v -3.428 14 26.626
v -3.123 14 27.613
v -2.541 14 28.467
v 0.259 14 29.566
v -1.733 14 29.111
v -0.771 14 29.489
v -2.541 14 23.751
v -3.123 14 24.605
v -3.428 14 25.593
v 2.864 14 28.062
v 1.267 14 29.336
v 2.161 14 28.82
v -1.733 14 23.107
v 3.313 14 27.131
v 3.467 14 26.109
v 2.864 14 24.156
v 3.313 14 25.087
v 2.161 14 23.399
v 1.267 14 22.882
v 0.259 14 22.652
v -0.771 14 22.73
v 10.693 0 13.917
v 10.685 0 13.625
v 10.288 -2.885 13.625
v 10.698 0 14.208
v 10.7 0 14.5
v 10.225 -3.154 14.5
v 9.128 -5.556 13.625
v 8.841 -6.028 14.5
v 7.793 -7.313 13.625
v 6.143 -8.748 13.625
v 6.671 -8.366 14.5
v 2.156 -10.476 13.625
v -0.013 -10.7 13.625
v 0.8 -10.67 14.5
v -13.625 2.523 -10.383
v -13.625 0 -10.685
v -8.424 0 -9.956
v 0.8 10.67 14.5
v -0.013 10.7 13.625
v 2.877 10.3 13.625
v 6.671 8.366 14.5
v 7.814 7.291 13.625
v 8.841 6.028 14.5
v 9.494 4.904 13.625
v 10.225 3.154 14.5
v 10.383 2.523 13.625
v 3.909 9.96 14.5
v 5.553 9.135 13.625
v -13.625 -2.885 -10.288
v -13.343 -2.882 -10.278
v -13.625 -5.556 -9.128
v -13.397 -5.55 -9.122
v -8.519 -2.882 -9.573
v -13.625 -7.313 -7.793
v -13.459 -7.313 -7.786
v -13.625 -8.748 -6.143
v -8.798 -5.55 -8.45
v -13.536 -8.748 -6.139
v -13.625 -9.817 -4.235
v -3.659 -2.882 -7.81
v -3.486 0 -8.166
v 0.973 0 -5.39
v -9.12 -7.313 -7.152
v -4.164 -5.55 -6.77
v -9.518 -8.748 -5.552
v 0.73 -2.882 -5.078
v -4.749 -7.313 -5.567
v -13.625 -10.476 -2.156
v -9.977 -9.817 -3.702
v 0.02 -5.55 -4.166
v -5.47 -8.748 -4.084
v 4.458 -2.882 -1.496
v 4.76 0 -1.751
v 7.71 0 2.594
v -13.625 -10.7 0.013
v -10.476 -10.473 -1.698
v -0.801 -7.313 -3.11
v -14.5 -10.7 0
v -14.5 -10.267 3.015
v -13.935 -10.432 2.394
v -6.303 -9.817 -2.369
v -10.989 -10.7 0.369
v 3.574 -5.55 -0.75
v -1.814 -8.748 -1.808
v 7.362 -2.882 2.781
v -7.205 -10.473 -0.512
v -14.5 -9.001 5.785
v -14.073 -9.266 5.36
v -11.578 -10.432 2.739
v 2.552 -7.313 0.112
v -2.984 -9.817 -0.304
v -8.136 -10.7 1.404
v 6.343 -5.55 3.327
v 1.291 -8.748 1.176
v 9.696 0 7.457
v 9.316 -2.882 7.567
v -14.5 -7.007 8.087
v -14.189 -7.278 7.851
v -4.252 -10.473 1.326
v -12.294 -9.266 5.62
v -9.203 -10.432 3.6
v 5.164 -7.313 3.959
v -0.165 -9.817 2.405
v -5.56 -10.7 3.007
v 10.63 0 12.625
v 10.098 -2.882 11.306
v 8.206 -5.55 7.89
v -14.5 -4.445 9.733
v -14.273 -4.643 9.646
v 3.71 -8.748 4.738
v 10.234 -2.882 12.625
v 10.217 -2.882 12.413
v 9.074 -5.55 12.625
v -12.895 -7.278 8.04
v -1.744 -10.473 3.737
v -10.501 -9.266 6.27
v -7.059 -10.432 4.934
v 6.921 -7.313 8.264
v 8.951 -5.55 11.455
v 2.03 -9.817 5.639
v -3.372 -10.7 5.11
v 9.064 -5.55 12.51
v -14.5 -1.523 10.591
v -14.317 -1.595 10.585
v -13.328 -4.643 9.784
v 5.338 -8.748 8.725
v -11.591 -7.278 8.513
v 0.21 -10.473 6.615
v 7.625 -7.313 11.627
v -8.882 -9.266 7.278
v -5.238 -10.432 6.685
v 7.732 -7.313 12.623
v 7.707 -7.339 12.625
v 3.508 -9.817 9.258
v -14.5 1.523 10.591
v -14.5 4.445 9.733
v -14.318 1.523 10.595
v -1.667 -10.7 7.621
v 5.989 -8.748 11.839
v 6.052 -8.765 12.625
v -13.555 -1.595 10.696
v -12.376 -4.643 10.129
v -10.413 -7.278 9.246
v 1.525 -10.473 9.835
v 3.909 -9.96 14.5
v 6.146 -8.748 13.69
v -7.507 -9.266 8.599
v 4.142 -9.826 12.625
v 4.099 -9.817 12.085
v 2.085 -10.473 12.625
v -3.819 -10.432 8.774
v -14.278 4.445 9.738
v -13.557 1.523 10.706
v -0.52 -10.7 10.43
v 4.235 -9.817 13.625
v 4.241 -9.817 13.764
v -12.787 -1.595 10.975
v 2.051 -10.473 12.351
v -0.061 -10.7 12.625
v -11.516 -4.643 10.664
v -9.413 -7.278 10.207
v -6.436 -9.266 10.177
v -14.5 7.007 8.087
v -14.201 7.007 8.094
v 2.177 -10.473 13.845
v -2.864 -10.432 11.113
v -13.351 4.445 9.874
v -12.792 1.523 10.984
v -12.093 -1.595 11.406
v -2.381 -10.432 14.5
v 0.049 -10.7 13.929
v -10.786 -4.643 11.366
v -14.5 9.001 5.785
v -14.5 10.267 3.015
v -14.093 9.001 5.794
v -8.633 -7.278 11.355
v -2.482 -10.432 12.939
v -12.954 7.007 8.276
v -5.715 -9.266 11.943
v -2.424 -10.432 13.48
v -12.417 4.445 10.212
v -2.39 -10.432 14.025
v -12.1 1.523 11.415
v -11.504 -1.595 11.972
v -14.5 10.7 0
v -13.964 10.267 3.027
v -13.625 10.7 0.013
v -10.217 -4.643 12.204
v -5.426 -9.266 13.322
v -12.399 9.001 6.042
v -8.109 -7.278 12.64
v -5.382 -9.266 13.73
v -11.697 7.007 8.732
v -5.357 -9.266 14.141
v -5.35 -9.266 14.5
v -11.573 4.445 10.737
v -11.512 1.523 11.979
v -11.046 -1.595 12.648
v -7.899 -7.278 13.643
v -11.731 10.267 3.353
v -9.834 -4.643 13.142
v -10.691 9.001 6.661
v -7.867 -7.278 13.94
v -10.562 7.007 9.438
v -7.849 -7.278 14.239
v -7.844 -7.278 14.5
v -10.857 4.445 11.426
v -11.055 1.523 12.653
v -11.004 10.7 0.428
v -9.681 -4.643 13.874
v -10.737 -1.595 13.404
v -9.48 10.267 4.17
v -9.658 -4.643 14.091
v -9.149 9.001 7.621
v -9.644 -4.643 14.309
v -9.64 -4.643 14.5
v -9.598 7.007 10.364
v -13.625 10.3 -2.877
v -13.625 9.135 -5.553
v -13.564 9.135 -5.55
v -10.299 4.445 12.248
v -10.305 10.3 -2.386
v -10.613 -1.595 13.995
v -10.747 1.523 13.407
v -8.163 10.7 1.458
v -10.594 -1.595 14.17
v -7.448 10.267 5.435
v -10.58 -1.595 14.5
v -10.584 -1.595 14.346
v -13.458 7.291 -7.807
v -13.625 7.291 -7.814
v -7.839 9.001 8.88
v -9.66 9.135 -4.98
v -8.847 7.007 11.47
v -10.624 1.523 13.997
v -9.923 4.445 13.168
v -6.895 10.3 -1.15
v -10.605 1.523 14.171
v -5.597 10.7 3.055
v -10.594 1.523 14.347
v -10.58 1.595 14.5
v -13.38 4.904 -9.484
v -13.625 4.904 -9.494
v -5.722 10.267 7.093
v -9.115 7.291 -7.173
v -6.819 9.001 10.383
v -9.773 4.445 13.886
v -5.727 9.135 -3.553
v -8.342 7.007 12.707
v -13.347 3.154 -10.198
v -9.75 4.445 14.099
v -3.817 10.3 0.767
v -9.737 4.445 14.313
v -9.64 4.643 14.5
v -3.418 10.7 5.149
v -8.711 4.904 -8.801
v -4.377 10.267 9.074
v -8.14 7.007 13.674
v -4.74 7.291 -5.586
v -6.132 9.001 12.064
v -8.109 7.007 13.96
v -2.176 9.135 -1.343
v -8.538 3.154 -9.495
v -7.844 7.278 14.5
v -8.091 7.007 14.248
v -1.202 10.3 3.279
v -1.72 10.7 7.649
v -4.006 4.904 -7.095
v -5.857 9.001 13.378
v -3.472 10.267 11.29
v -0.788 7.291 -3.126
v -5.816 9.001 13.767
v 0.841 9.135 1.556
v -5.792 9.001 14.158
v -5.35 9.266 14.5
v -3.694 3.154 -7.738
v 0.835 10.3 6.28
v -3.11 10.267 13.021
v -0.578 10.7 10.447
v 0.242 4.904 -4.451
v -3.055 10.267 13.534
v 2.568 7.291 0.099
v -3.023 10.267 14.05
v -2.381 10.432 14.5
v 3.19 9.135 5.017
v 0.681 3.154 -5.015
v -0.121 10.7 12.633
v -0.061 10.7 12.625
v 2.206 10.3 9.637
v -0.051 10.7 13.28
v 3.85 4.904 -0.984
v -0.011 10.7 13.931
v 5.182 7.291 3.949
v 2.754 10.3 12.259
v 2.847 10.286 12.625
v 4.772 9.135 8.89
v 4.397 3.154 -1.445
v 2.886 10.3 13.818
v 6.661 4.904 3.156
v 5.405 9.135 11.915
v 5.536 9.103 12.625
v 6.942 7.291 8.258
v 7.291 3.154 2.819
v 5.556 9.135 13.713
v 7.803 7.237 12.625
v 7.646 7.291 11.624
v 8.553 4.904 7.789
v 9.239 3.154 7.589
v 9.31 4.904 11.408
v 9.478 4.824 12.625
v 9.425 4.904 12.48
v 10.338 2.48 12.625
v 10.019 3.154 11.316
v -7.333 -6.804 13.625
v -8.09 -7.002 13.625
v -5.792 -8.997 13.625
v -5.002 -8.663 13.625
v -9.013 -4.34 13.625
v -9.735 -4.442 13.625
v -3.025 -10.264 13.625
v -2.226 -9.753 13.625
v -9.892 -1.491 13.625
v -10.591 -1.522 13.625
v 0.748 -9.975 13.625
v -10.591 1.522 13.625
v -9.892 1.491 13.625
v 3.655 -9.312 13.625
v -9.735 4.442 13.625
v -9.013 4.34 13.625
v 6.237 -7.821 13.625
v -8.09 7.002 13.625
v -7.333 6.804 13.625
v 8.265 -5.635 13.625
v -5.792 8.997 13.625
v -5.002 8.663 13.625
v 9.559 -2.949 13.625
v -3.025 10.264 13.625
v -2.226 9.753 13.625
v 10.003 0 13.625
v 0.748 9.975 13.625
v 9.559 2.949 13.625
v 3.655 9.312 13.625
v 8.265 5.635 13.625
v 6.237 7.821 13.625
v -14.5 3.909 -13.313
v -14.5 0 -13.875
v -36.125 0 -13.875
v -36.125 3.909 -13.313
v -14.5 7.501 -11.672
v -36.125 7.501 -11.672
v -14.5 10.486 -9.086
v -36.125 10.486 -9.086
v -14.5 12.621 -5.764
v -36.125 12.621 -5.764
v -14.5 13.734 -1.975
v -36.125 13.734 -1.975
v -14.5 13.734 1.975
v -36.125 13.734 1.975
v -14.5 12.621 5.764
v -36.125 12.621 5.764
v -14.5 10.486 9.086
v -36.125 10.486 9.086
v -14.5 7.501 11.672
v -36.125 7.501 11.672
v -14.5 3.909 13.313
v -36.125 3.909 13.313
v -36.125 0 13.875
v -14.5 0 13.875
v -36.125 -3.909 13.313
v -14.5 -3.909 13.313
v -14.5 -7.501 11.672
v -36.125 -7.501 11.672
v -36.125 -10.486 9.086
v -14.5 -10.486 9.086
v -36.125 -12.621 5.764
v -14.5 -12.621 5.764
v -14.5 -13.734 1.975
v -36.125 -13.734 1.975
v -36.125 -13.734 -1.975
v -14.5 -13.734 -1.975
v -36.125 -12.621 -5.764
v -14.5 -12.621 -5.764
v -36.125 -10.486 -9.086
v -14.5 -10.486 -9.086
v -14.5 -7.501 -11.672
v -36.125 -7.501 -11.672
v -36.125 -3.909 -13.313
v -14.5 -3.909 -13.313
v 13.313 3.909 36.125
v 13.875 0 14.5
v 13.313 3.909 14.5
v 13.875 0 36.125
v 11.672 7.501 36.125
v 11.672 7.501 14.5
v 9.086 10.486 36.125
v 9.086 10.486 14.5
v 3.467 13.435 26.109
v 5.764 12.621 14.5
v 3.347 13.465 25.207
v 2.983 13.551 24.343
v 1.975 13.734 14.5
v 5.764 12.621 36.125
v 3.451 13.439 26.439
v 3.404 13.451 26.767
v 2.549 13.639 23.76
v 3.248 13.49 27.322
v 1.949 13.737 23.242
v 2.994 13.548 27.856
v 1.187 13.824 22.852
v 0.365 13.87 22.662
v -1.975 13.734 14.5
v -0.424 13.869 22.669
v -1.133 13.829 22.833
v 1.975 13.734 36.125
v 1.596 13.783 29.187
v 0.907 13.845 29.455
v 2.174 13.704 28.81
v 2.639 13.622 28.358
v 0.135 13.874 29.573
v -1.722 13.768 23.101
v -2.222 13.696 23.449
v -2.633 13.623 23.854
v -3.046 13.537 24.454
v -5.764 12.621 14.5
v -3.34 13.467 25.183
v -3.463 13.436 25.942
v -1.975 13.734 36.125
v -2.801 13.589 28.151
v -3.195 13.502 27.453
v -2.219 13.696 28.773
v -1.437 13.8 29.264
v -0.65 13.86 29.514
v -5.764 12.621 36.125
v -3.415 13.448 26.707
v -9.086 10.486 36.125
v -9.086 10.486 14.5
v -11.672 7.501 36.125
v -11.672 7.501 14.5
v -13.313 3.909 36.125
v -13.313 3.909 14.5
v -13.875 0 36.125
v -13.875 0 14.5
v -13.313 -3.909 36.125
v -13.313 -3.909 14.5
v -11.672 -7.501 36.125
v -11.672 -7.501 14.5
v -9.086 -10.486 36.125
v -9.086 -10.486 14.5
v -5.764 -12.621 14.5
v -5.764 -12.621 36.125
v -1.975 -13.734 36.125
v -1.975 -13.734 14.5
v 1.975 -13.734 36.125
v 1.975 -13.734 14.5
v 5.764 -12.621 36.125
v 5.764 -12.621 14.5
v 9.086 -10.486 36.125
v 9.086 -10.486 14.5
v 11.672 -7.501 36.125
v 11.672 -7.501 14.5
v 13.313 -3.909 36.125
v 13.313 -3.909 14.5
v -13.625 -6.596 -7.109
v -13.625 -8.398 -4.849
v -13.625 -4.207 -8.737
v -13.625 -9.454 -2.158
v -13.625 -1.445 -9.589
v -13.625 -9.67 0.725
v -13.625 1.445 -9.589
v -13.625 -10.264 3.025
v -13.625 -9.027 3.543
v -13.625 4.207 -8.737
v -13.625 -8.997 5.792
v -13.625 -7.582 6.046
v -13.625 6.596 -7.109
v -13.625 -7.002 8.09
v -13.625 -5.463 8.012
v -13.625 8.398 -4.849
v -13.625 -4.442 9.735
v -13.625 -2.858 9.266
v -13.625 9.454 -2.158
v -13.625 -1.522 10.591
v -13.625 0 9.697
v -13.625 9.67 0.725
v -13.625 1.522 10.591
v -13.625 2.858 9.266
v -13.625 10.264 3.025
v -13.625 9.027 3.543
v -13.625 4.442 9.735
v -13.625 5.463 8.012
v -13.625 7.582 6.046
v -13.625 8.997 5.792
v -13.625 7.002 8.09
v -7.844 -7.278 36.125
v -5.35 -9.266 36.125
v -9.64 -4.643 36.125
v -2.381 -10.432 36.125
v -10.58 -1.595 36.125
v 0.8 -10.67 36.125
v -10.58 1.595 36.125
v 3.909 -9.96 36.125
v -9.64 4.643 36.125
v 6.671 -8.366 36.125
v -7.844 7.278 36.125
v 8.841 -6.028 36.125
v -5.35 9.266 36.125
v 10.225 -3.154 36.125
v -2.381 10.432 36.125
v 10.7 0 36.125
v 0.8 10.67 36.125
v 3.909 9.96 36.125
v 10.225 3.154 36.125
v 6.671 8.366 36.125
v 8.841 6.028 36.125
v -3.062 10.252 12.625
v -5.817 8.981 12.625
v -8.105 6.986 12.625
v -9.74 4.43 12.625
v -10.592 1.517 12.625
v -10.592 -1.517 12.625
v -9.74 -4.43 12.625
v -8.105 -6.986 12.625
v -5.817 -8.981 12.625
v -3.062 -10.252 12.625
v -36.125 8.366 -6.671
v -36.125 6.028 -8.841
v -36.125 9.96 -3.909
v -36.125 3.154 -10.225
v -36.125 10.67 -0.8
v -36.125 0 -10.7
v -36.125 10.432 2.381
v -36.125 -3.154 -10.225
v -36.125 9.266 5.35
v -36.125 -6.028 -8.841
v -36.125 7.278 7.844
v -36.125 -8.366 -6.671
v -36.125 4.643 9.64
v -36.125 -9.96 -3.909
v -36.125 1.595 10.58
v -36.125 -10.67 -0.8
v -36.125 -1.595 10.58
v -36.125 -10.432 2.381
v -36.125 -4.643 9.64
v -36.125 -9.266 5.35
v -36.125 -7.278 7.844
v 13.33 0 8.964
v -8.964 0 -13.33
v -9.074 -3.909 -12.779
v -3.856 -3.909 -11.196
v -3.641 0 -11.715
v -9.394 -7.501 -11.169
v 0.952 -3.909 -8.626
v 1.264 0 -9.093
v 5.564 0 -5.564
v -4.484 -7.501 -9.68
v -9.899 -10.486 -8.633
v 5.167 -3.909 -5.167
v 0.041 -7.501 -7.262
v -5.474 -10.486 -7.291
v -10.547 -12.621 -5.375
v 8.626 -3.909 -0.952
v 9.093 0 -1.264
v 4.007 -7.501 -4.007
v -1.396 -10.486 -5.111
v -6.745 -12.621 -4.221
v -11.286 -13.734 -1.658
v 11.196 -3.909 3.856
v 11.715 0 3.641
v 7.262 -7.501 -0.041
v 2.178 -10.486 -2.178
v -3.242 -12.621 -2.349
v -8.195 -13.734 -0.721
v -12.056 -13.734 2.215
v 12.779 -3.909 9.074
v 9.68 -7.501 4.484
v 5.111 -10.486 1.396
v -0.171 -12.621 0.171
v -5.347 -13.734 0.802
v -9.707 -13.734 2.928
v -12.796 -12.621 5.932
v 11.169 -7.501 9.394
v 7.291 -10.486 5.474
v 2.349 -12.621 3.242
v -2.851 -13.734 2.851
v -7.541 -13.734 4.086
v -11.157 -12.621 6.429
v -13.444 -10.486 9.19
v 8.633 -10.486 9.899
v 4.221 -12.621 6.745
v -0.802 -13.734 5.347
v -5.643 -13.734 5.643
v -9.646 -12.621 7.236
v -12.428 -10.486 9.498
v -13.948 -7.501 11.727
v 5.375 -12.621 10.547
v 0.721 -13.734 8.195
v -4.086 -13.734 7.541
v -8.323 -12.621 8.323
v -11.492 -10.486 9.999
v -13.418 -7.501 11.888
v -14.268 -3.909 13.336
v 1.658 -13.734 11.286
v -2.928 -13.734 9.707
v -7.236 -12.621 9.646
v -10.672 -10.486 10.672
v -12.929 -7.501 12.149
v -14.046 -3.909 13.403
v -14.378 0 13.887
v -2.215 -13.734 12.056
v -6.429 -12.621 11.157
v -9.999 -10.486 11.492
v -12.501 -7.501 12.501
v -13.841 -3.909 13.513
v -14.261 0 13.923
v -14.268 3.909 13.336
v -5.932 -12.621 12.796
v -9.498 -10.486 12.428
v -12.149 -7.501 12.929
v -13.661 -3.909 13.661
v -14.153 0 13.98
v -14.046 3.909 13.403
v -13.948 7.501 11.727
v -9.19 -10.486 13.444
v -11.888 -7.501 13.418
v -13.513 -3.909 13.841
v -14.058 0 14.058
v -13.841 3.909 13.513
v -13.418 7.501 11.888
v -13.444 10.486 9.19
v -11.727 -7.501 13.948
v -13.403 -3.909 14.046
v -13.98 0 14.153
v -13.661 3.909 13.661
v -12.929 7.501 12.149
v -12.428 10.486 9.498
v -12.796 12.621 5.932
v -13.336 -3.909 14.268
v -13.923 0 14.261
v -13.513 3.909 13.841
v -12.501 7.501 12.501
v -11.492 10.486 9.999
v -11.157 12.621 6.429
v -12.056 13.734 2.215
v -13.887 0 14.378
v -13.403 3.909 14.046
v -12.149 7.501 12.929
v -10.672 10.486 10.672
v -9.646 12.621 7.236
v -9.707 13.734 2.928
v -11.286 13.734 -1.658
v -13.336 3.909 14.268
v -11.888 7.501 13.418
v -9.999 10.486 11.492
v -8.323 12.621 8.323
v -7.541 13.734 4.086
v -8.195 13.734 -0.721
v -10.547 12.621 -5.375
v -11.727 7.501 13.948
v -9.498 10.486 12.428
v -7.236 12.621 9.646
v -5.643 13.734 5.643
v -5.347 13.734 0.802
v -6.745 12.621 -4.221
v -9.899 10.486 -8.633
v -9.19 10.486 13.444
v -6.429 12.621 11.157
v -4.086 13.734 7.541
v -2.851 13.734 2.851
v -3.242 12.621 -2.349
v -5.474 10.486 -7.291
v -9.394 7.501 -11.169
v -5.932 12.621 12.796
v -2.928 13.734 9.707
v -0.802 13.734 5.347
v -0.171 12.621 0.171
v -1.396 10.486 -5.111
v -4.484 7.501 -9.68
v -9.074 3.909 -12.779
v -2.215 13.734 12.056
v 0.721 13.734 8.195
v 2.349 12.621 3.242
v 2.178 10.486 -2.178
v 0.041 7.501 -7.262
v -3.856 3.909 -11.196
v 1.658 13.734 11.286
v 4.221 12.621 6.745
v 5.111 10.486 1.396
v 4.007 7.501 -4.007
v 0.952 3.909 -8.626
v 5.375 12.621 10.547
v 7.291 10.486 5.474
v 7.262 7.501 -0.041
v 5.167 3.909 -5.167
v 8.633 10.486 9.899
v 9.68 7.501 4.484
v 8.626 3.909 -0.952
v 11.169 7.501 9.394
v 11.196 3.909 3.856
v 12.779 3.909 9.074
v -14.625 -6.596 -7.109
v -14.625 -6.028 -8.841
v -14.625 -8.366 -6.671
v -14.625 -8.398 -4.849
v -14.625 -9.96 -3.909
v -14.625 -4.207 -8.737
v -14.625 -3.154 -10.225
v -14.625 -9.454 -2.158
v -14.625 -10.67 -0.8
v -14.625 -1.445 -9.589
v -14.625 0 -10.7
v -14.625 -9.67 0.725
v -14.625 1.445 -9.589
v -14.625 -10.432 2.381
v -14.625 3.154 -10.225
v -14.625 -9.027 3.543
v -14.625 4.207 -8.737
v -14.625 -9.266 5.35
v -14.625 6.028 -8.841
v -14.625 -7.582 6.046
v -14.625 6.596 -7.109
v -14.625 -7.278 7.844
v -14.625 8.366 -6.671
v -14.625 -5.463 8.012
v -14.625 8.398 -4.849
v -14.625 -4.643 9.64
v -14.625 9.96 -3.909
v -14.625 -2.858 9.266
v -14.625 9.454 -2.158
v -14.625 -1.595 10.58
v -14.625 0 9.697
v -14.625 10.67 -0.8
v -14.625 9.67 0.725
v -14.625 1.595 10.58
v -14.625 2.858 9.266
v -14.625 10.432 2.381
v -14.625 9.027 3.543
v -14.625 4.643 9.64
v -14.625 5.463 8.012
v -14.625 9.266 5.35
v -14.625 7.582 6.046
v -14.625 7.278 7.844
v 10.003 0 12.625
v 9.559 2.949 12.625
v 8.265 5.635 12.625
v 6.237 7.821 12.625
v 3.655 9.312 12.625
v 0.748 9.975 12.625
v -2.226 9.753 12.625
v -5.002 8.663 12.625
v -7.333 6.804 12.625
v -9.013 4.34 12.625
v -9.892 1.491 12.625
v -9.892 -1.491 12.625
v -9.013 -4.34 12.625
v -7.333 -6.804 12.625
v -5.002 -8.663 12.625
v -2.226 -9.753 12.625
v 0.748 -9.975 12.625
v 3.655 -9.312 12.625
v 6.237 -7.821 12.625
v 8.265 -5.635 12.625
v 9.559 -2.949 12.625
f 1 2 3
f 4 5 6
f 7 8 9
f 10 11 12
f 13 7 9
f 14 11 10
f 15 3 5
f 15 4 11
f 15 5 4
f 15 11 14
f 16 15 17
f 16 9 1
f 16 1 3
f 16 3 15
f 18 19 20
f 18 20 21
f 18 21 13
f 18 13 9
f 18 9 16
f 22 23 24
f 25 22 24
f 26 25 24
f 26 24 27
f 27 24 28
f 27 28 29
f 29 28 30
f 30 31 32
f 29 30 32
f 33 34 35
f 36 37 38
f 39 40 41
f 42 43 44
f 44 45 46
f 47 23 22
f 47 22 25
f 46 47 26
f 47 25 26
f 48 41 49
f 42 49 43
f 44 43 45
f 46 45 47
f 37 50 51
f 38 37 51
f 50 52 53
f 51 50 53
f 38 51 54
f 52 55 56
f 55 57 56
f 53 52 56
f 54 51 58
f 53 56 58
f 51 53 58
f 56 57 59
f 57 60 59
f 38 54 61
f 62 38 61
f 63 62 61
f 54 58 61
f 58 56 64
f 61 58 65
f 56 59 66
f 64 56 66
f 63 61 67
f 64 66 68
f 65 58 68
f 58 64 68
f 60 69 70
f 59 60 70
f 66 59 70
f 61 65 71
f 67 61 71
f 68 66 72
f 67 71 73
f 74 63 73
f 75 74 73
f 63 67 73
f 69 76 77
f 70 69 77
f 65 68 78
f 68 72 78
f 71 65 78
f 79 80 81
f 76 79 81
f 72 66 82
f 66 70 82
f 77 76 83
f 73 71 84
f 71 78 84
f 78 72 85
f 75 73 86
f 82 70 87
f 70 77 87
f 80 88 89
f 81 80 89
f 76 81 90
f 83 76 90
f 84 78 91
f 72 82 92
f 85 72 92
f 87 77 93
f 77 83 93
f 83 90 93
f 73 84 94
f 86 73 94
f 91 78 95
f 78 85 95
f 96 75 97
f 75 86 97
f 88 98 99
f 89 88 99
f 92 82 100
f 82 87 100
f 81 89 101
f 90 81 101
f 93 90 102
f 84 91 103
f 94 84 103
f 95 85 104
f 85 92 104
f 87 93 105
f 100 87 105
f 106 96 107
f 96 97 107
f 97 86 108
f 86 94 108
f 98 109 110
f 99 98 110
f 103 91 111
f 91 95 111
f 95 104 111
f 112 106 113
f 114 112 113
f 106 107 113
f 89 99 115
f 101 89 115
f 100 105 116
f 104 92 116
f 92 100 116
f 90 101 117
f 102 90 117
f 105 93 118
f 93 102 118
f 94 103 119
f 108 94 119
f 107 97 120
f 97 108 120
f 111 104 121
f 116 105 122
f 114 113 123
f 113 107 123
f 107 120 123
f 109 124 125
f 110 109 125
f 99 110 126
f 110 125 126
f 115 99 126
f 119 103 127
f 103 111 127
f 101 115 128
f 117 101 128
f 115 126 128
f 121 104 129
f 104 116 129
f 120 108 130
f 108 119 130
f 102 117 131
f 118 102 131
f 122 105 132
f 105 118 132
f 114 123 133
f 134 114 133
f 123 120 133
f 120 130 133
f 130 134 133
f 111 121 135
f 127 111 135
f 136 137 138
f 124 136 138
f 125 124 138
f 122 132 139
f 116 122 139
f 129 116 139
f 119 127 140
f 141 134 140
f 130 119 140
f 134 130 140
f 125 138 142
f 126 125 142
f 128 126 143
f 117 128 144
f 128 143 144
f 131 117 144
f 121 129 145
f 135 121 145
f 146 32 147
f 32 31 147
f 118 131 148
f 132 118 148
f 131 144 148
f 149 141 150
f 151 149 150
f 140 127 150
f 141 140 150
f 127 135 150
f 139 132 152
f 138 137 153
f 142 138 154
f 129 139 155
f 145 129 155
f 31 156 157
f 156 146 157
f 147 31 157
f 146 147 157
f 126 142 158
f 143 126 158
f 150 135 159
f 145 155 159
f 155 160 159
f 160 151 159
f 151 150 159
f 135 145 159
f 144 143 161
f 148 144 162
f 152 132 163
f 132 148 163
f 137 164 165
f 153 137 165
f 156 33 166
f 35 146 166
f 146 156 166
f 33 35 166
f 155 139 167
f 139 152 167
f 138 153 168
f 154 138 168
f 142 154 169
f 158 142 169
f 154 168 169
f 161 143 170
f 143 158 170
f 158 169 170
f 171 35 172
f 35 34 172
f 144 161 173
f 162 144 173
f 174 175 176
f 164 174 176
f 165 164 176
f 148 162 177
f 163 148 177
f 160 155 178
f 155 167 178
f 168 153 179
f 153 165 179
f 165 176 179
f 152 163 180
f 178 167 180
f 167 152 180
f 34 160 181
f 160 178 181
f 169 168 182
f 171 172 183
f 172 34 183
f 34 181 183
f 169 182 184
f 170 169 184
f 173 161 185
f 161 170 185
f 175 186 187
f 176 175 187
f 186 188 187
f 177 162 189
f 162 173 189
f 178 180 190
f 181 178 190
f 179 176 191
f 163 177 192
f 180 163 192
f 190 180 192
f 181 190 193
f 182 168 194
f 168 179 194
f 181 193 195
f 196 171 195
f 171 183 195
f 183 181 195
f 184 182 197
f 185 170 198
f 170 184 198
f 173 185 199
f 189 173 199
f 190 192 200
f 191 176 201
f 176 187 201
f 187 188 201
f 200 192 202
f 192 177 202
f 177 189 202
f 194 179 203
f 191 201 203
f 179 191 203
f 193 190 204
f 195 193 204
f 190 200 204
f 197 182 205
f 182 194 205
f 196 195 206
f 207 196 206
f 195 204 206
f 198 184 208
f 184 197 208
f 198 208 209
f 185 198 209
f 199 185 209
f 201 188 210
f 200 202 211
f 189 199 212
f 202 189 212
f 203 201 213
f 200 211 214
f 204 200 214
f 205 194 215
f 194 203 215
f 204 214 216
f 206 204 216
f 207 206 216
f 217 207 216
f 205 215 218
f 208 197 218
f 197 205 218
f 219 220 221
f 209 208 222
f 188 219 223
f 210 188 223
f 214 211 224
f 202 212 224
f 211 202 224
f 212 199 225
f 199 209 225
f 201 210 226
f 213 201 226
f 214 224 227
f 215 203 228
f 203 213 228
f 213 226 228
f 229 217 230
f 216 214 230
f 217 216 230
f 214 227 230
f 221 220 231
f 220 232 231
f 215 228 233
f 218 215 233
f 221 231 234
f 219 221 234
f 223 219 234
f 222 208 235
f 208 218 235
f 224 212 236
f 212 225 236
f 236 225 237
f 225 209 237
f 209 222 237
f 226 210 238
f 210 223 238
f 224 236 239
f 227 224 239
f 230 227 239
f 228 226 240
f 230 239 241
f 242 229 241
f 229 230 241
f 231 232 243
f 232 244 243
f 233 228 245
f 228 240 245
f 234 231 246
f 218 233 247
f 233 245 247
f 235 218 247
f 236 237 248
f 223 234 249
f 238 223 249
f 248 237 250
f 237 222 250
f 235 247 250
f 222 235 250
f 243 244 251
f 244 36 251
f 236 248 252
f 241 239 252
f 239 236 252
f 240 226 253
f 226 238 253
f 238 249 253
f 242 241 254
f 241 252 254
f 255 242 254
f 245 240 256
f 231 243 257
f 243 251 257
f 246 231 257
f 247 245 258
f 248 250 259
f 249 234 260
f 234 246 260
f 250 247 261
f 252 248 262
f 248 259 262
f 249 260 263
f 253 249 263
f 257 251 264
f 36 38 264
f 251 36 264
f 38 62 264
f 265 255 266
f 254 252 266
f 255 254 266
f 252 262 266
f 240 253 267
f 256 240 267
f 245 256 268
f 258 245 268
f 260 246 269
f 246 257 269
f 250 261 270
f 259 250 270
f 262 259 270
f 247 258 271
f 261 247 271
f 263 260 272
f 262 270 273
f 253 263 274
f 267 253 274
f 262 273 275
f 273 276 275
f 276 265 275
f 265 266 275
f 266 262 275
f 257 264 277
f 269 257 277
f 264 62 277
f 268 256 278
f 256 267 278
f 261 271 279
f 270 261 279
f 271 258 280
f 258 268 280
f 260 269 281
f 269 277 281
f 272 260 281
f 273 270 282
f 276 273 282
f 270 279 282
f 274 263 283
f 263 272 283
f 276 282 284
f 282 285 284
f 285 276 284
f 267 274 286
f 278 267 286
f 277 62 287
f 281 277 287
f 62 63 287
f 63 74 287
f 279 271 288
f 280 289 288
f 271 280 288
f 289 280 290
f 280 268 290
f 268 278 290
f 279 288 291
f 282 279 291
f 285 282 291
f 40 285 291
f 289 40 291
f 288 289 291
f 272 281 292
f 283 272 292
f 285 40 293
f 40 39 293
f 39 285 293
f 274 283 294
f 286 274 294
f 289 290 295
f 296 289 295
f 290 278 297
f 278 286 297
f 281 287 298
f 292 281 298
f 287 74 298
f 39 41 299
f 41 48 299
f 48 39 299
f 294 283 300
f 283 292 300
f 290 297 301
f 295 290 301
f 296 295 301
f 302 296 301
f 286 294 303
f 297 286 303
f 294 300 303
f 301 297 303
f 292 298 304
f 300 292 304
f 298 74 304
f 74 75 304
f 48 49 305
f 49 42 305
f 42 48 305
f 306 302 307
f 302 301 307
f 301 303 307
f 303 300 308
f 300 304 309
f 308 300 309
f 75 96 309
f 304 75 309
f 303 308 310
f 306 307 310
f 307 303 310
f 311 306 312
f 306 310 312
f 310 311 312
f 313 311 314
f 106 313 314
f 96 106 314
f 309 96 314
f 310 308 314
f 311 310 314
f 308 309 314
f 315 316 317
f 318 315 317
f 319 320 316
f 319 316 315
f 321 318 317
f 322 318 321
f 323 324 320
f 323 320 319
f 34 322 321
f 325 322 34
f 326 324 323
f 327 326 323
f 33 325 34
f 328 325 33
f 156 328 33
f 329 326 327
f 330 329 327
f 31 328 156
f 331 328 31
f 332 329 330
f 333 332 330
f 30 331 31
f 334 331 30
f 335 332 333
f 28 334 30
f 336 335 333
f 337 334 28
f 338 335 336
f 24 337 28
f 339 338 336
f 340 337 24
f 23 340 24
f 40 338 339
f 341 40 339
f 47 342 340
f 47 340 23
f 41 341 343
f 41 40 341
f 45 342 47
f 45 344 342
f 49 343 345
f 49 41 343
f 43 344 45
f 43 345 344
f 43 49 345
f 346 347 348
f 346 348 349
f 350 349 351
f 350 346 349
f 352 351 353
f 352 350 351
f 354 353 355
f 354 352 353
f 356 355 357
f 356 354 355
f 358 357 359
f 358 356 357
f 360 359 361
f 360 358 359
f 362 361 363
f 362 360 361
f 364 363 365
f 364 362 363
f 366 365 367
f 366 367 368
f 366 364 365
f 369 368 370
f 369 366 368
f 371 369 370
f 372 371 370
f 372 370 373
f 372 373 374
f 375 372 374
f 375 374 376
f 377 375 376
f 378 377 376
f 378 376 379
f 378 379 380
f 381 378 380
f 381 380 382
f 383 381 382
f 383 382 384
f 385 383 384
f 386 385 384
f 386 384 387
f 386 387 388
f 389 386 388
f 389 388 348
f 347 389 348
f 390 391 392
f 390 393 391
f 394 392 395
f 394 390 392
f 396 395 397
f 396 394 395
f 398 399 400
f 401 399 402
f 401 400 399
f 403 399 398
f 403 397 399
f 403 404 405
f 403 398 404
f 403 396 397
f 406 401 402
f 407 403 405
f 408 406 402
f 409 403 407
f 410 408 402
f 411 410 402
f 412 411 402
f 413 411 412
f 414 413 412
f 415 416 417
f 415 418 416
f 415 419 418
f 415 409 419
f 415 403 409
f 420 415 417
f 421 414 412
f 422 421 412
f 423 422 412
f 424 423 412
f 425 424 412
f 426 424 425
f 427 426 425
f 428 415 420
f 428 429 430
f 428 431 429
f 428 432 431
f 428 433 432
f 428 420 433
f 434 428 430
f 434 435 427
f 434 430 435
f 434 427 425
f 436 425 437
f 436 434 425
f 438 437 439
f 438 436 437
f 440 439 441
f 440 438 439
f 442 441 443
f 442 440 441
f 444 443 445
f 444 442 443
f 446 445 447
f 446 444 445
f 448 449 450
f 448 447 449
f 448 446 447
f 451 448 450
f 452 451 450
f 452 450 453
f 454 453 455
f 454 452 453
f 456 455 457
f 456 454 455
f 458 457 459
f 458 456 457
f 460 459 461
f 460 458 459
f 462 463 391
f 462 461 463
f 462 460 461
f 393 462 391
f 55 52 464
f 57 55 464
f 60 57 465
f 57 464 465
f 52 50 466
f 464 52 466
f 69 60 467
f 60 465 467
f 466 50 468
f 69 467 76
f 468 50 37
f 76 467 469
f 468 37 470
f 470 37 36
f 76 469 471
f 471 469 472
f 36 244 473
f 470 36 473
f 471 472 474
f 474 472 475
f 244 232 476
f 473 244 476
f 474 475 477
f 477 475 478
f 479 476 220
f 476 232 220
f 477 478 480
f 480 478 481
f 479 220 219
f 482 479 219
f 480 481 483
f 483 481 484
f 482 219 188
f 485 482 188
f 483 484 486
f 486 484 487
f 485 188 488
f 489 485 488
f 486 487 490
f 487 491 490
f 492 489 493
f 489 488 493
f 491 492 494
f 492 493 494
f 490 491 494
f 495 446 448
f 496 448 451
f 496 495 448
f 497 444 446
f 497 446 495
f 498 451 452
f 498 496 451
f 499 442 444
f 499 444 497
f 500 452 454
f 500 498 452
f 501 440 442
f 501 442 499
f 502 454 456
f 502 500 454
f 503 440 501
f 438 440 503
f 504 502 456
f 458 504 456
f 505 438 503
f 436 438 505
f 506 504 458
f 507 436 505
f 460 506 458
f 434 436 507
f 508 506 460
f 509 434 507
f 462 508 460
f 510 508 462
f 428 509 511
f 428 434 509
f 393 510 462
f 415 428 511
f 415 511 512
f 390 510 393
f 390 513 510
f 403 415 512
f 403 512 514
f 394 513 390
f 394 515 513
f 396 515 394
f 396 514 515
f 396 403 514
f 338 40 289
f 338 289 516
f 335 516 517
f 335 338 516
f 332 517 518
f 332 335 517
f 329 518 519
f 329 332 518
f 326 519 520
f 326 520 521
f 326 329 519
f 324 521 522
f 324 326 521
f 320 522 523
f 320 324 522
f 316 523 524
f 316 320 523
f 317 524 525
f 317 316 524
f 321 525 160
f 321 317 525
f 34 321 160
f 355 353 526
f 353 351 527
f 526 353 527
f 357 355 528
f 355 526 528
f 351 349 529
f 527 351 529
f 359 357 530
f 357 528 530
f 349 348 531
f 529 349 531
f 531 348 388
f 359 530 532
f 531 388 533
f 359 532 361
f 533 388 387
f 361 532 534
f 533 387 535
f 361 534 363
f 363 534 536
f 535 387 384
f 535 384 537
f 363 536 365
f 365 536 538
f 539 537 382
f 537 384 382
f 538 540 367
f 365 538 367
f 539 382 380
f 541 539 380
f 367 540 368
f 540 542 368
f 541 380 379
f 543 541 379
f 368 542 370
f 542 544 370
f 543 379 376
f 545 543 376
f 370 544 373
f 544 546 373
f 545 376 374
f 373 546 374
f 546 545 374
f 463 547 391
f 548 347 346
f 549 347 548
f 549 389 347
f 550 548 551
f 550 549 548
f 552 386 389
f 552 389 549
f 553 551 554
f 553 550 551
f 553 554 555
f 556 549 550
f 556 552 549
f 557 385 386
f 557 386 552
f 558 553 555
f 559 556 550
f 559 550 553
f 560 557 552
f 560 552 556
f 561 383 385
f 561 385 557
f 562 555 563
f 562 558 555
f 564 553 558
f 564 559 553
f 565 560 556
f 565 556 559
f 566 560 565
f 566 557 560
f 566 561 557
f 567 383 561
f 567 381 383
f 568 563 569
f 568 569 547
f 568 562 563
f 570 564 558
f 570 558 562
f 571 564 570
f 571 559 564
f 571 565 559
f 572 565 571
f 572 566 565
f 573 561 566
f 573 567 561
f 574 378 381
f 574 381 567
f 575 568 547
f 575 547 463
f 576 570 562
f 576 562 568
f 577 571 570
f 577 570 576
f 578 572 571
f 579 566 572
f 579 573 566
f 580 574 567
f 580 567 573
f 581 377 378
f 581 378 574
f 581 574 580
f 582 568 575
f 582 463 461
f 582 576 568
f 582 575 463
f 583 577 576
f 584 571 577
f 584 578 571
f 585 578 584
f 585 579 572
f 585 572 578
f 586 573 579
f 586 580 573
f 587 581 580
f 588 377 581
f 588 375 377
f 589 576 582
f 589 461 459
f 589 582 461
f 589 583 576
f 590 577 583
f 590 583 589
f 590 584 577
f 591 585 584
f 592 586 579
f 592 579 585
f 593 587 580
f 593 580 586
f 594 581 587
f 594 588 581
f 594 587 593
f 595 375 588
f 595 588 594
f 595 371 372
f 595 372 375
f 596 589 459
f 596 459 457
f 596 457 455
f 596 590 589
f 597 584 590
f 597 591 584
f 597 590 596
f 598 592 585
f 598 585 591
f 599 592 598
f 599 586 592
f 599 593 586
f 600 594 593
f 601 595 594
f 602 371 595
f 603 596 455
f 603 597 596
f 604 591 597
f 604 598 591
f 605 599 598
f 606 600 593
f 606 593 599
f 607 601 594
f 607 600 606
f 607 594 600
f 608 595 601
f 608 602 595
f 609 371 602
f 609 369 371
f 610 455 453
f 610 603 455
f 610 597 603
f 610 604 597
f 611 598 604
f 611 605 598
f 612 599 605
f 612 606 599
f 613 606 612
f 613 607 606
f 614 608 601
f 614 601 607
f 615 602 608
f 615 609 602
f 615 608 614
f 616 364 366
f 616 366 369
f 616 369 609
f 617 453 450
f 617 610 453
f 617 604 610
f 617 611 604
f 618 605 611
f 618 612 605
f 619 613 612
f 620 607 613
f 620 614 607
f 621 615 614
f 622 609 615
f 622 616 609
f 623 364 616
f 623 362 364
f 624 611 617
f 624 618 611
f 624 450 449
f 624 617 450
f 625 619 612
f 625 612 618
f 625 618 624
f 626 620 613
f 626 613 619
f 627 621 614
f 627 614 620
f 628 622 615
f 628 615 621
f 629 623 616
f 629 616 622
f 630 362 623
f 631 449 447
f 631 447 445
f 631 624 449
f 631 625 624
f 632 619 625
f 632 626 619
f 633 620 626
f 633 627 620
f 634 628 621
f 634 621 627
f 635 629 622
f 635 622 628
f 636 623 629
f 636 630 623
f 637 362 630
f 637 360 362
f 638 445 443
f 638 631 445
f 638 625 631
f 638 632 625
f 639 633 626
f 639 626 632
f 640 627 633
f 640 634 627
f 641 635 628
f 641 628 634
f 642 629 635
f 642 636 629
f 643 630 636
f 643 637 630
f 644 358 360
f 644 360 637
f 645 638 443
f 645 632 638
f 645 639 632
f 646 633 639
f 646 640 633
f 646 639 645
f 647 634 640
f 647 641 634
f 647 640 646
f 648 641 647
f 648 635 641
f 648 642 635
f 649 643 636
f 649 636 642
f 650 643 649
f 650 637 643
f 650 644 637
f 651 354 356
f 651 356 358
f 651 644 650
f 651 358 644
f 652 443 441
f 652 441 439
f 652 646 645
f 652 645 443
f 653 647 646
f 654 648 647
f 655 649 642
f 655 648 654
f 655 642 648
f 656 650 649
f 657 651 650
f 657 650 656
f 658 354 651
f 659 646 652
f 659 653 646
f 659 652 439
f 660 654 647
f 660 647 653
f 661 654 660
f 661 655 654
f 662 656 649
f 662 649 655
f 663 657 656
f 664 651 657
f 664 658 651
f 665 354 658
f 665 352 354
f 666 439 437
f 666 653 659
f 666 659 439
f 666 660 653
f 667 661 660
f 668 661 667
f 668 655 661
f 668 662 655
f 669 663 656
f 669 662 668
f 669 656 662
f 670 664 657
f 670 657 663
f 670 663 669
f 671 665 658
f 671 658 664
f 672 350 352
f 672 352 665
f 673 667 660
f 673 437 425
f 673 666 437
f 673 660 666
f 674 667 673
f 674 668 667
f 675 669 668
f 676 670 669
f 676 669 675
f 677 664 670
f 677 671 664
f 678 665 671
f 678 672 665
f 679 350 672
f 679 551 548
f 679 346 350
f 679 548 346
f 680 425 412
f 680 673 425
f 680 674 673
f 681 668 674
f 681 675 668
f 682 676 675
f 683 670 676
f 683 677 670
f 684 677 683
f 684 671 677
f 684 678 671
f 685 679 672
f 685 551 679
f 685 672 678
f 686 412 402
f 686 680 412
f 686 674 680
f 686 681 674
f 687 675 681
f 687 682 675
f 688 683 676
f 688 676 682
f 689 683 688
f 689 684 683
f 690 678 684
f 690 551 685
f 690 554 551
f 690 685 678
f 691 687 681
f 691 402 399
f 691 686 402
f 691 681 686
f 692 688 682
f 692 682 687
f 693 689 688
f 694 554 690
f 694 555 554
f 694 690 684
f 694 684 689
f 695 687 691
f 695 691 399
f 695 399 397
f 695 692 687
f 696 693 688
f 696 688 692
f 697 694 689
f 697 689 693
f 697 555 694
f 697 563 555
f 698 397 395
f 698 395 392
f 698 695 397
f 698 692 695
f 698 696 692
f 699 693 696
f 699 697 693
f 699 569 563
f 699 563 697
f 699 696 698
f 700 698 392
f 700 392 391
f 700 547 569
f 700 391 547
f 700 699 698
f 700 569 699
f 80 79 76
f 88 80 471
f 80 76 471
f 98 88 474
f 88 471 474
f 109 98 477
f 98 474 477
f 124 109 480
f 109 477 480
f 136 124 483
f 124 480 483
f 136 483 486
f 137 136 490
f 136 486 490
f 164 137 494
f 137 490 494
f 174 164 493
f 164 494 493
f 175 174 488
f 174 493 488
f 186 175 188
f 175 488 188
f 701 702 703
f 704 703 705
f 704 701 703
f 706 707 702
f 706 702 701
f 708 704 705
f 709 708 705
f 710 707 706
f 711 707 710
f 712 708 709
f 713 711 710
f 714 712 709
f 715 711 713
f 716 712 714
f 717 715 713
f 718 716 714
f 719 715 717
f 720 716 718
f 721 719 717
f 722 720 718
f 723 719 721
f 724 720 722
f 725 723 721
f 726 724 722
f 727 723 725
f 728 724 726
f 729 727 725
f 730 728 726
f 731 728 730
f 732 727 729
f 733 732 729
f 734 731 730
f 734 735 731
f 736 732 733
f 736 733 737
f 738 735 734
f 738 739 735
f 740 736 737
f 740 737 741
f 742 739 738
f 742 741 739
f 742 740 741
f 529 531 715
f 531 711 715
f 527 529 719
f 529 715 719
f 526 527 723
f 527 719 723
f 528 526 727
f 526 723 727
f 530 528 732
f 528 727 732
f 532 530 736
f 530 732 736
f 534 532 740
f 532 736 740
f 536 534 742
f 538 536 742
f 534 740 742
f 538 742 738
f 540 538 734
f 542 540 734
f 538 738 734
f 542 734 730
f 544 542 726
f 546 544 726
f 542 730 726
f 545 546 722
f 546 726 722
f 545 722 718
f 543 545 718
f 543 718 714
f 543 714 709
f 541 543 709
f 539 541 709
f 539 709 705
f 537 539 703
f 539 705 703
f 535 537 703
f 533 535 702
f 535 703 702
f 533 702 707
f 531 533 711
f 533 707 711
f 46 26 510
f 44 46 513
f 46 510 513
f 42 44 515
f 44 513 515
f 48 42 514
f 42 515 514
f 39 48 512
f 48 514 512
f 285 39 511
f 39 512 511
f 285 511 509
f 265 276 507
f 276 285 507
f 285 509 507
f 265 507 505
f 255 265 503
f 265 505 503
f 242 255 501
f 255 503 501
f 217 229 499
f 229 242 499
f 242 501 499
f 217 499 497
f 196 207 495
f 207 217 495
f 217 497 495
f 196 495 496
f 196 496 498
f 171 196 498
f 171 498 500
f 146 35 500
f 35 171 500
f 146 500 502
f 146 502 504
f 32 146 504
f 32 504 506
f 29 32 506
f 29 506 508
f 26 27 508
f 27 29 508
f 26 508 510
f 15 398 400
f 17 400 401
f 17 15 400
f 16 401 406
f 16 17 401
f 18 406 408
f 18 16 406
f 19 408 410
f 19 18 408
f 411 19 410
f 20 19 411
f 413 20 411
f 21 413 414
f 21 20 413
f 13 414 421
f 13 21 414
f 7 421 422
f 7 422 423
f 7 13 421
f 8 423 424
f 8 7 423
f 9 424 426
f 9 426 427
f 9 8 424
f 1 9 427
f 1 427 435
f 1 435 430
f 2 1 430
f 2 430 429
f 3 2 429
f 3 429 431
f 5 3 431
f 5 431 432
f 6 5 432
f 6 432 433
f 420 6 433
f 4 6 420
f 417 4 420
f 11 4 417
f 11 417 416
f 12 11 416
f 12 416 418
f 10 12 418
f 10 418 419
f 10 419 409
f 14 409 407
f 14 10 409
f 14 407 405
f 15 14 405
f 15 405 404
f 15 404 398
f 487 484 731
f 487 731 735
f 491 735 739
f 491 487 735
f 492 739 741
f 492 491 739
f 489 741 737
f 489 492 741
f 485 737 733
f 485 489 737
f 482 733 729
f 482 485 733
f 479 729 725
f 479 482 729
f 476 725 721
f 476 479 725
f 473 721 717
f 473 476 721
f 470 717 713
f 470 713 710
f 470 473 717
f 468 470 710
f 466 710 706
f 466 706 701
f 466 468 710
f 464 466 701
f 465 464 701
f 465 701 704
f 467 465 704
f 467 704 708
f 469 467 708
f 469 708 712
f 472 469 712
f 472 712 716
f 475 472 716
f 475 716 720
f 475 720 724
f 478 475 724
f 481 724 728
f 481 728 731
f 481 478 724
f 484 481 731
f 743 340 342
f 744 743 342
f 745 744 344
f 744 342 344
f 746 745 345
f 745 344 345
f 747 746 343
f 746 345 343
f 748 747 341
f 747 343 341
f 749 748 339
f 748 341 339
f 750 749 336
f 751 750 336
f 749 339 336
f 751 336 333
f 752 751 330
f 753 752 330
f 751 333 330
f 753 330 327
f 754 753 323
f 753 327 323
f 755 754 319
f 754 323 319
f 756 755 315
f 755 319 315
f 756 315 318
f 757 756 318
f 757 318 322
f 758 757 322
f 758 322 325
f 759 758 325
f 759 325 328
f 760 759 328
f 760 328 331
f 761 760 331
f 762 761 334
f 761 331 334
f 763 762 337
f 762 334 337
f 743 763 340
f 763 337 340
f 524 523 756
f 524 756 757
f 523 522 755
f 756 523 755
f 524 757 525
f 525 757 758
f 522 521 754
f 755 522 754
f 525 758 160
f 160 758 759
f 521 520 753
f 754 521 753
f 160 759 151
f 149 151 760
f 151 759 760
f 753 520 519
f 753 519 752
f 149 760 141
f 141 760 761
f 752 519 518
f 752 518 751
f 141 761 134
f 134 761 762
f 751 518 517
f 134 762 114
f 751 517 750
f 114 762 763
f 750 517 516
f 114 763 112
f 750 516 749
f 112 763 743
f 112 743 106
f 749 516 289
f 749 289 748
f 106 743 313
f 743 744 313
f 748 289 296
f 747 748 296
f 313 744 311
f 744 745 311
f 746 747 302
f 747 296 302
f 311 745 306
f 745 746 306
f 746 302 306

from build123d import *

# Parameters (mm, degrees)
CROQUIS2_R              = 13.875
CROQUIS2_R_2            = 10.7
SALIENTE_EXTRUIR1_START = -22.5
CROQUIS3_R              = 10.7
CROQUIS3_R_2            = 10.003405024
SALIENTE_EXTRUIR1_DEPTH = 1
SALIENTE_EXTRUIR2_START = -22.5
CROQUIS5_R              = 10.7
CROQUIS5_R_2            = 9.69715728
SALIENTE_EXTRUIR2_DEPTH = 1
SALIENTE_EXTRUIR3_START = 14
CROQUIS6_R              = 3.466635683
SALIENTE_EXTRUIR3_DEPTH = 1


with BuildPart() as part:
    # Barrer1: sweep along a path in Croquis1
    with BuildLine(Plane(origin=(0, 0, 0), x_dir=(1, 0, 0), z_dir=(0, 1, 0))) as barrer1_path:
        Line((-36.125, 0), (-14.5, 0))
        ThreePointArc((-14.5, 0), (-4.246951673, -4.246951673), (0, -14.5))
        Line((0, -14.5), (0, -36.125))
    # Croquis2 → Barrer1 (sweep)
    with BuildSketch(Plane.XY.offset(36.125)):
        Circle(CROQUIS2_R)
        Circle(CROQUIS2_R_2, mode=Mode.SUBTRACT)
    sweep(path=barrer1_path.line)

    # Croquis3 → Saliente-Extruir1 (add)
    with BuildSketch(Plane.XY.offset(36.125).offset(SALIENTE_EXTRUIR1_START)):
        Circle(CROQUIS3_R)
        Circle(CROQUIS3_R_2, mode=Mode.SUBTRACT)
    extrude(amount=-SALIENTE_EXTRUIR1_DEPTH)

    # Croquis5 → Saliente-Extruir2 (add)
    with BuildSketch(Plane.ZY.offset(36.125).offset(SALIENTE_EXTRUIR2_START)):
        Circle(CROQUIS5_R)
        Circle(CROQUIS5_R_2, mode=Mode.SUBTRACT)
    extrude(amount=SALIENTE_EXTRUIR2_DEPTH)

    # Croquis6 → Saliente-Extruir3 (add)
    with BuildSketch(Plane(origin=(0, 0, 0), x_dir=(1, 0, 0), z_dir=(0, 1, 0)).offset(SALIENTE_EXTRUIR3_START)):
        with Locations((0, -26.109260765)):
            Circle(CROQUIS6_R)
    extrude(amount=-SALIENTE_EXTRUIR3_DEPTH)


solid = part.part
